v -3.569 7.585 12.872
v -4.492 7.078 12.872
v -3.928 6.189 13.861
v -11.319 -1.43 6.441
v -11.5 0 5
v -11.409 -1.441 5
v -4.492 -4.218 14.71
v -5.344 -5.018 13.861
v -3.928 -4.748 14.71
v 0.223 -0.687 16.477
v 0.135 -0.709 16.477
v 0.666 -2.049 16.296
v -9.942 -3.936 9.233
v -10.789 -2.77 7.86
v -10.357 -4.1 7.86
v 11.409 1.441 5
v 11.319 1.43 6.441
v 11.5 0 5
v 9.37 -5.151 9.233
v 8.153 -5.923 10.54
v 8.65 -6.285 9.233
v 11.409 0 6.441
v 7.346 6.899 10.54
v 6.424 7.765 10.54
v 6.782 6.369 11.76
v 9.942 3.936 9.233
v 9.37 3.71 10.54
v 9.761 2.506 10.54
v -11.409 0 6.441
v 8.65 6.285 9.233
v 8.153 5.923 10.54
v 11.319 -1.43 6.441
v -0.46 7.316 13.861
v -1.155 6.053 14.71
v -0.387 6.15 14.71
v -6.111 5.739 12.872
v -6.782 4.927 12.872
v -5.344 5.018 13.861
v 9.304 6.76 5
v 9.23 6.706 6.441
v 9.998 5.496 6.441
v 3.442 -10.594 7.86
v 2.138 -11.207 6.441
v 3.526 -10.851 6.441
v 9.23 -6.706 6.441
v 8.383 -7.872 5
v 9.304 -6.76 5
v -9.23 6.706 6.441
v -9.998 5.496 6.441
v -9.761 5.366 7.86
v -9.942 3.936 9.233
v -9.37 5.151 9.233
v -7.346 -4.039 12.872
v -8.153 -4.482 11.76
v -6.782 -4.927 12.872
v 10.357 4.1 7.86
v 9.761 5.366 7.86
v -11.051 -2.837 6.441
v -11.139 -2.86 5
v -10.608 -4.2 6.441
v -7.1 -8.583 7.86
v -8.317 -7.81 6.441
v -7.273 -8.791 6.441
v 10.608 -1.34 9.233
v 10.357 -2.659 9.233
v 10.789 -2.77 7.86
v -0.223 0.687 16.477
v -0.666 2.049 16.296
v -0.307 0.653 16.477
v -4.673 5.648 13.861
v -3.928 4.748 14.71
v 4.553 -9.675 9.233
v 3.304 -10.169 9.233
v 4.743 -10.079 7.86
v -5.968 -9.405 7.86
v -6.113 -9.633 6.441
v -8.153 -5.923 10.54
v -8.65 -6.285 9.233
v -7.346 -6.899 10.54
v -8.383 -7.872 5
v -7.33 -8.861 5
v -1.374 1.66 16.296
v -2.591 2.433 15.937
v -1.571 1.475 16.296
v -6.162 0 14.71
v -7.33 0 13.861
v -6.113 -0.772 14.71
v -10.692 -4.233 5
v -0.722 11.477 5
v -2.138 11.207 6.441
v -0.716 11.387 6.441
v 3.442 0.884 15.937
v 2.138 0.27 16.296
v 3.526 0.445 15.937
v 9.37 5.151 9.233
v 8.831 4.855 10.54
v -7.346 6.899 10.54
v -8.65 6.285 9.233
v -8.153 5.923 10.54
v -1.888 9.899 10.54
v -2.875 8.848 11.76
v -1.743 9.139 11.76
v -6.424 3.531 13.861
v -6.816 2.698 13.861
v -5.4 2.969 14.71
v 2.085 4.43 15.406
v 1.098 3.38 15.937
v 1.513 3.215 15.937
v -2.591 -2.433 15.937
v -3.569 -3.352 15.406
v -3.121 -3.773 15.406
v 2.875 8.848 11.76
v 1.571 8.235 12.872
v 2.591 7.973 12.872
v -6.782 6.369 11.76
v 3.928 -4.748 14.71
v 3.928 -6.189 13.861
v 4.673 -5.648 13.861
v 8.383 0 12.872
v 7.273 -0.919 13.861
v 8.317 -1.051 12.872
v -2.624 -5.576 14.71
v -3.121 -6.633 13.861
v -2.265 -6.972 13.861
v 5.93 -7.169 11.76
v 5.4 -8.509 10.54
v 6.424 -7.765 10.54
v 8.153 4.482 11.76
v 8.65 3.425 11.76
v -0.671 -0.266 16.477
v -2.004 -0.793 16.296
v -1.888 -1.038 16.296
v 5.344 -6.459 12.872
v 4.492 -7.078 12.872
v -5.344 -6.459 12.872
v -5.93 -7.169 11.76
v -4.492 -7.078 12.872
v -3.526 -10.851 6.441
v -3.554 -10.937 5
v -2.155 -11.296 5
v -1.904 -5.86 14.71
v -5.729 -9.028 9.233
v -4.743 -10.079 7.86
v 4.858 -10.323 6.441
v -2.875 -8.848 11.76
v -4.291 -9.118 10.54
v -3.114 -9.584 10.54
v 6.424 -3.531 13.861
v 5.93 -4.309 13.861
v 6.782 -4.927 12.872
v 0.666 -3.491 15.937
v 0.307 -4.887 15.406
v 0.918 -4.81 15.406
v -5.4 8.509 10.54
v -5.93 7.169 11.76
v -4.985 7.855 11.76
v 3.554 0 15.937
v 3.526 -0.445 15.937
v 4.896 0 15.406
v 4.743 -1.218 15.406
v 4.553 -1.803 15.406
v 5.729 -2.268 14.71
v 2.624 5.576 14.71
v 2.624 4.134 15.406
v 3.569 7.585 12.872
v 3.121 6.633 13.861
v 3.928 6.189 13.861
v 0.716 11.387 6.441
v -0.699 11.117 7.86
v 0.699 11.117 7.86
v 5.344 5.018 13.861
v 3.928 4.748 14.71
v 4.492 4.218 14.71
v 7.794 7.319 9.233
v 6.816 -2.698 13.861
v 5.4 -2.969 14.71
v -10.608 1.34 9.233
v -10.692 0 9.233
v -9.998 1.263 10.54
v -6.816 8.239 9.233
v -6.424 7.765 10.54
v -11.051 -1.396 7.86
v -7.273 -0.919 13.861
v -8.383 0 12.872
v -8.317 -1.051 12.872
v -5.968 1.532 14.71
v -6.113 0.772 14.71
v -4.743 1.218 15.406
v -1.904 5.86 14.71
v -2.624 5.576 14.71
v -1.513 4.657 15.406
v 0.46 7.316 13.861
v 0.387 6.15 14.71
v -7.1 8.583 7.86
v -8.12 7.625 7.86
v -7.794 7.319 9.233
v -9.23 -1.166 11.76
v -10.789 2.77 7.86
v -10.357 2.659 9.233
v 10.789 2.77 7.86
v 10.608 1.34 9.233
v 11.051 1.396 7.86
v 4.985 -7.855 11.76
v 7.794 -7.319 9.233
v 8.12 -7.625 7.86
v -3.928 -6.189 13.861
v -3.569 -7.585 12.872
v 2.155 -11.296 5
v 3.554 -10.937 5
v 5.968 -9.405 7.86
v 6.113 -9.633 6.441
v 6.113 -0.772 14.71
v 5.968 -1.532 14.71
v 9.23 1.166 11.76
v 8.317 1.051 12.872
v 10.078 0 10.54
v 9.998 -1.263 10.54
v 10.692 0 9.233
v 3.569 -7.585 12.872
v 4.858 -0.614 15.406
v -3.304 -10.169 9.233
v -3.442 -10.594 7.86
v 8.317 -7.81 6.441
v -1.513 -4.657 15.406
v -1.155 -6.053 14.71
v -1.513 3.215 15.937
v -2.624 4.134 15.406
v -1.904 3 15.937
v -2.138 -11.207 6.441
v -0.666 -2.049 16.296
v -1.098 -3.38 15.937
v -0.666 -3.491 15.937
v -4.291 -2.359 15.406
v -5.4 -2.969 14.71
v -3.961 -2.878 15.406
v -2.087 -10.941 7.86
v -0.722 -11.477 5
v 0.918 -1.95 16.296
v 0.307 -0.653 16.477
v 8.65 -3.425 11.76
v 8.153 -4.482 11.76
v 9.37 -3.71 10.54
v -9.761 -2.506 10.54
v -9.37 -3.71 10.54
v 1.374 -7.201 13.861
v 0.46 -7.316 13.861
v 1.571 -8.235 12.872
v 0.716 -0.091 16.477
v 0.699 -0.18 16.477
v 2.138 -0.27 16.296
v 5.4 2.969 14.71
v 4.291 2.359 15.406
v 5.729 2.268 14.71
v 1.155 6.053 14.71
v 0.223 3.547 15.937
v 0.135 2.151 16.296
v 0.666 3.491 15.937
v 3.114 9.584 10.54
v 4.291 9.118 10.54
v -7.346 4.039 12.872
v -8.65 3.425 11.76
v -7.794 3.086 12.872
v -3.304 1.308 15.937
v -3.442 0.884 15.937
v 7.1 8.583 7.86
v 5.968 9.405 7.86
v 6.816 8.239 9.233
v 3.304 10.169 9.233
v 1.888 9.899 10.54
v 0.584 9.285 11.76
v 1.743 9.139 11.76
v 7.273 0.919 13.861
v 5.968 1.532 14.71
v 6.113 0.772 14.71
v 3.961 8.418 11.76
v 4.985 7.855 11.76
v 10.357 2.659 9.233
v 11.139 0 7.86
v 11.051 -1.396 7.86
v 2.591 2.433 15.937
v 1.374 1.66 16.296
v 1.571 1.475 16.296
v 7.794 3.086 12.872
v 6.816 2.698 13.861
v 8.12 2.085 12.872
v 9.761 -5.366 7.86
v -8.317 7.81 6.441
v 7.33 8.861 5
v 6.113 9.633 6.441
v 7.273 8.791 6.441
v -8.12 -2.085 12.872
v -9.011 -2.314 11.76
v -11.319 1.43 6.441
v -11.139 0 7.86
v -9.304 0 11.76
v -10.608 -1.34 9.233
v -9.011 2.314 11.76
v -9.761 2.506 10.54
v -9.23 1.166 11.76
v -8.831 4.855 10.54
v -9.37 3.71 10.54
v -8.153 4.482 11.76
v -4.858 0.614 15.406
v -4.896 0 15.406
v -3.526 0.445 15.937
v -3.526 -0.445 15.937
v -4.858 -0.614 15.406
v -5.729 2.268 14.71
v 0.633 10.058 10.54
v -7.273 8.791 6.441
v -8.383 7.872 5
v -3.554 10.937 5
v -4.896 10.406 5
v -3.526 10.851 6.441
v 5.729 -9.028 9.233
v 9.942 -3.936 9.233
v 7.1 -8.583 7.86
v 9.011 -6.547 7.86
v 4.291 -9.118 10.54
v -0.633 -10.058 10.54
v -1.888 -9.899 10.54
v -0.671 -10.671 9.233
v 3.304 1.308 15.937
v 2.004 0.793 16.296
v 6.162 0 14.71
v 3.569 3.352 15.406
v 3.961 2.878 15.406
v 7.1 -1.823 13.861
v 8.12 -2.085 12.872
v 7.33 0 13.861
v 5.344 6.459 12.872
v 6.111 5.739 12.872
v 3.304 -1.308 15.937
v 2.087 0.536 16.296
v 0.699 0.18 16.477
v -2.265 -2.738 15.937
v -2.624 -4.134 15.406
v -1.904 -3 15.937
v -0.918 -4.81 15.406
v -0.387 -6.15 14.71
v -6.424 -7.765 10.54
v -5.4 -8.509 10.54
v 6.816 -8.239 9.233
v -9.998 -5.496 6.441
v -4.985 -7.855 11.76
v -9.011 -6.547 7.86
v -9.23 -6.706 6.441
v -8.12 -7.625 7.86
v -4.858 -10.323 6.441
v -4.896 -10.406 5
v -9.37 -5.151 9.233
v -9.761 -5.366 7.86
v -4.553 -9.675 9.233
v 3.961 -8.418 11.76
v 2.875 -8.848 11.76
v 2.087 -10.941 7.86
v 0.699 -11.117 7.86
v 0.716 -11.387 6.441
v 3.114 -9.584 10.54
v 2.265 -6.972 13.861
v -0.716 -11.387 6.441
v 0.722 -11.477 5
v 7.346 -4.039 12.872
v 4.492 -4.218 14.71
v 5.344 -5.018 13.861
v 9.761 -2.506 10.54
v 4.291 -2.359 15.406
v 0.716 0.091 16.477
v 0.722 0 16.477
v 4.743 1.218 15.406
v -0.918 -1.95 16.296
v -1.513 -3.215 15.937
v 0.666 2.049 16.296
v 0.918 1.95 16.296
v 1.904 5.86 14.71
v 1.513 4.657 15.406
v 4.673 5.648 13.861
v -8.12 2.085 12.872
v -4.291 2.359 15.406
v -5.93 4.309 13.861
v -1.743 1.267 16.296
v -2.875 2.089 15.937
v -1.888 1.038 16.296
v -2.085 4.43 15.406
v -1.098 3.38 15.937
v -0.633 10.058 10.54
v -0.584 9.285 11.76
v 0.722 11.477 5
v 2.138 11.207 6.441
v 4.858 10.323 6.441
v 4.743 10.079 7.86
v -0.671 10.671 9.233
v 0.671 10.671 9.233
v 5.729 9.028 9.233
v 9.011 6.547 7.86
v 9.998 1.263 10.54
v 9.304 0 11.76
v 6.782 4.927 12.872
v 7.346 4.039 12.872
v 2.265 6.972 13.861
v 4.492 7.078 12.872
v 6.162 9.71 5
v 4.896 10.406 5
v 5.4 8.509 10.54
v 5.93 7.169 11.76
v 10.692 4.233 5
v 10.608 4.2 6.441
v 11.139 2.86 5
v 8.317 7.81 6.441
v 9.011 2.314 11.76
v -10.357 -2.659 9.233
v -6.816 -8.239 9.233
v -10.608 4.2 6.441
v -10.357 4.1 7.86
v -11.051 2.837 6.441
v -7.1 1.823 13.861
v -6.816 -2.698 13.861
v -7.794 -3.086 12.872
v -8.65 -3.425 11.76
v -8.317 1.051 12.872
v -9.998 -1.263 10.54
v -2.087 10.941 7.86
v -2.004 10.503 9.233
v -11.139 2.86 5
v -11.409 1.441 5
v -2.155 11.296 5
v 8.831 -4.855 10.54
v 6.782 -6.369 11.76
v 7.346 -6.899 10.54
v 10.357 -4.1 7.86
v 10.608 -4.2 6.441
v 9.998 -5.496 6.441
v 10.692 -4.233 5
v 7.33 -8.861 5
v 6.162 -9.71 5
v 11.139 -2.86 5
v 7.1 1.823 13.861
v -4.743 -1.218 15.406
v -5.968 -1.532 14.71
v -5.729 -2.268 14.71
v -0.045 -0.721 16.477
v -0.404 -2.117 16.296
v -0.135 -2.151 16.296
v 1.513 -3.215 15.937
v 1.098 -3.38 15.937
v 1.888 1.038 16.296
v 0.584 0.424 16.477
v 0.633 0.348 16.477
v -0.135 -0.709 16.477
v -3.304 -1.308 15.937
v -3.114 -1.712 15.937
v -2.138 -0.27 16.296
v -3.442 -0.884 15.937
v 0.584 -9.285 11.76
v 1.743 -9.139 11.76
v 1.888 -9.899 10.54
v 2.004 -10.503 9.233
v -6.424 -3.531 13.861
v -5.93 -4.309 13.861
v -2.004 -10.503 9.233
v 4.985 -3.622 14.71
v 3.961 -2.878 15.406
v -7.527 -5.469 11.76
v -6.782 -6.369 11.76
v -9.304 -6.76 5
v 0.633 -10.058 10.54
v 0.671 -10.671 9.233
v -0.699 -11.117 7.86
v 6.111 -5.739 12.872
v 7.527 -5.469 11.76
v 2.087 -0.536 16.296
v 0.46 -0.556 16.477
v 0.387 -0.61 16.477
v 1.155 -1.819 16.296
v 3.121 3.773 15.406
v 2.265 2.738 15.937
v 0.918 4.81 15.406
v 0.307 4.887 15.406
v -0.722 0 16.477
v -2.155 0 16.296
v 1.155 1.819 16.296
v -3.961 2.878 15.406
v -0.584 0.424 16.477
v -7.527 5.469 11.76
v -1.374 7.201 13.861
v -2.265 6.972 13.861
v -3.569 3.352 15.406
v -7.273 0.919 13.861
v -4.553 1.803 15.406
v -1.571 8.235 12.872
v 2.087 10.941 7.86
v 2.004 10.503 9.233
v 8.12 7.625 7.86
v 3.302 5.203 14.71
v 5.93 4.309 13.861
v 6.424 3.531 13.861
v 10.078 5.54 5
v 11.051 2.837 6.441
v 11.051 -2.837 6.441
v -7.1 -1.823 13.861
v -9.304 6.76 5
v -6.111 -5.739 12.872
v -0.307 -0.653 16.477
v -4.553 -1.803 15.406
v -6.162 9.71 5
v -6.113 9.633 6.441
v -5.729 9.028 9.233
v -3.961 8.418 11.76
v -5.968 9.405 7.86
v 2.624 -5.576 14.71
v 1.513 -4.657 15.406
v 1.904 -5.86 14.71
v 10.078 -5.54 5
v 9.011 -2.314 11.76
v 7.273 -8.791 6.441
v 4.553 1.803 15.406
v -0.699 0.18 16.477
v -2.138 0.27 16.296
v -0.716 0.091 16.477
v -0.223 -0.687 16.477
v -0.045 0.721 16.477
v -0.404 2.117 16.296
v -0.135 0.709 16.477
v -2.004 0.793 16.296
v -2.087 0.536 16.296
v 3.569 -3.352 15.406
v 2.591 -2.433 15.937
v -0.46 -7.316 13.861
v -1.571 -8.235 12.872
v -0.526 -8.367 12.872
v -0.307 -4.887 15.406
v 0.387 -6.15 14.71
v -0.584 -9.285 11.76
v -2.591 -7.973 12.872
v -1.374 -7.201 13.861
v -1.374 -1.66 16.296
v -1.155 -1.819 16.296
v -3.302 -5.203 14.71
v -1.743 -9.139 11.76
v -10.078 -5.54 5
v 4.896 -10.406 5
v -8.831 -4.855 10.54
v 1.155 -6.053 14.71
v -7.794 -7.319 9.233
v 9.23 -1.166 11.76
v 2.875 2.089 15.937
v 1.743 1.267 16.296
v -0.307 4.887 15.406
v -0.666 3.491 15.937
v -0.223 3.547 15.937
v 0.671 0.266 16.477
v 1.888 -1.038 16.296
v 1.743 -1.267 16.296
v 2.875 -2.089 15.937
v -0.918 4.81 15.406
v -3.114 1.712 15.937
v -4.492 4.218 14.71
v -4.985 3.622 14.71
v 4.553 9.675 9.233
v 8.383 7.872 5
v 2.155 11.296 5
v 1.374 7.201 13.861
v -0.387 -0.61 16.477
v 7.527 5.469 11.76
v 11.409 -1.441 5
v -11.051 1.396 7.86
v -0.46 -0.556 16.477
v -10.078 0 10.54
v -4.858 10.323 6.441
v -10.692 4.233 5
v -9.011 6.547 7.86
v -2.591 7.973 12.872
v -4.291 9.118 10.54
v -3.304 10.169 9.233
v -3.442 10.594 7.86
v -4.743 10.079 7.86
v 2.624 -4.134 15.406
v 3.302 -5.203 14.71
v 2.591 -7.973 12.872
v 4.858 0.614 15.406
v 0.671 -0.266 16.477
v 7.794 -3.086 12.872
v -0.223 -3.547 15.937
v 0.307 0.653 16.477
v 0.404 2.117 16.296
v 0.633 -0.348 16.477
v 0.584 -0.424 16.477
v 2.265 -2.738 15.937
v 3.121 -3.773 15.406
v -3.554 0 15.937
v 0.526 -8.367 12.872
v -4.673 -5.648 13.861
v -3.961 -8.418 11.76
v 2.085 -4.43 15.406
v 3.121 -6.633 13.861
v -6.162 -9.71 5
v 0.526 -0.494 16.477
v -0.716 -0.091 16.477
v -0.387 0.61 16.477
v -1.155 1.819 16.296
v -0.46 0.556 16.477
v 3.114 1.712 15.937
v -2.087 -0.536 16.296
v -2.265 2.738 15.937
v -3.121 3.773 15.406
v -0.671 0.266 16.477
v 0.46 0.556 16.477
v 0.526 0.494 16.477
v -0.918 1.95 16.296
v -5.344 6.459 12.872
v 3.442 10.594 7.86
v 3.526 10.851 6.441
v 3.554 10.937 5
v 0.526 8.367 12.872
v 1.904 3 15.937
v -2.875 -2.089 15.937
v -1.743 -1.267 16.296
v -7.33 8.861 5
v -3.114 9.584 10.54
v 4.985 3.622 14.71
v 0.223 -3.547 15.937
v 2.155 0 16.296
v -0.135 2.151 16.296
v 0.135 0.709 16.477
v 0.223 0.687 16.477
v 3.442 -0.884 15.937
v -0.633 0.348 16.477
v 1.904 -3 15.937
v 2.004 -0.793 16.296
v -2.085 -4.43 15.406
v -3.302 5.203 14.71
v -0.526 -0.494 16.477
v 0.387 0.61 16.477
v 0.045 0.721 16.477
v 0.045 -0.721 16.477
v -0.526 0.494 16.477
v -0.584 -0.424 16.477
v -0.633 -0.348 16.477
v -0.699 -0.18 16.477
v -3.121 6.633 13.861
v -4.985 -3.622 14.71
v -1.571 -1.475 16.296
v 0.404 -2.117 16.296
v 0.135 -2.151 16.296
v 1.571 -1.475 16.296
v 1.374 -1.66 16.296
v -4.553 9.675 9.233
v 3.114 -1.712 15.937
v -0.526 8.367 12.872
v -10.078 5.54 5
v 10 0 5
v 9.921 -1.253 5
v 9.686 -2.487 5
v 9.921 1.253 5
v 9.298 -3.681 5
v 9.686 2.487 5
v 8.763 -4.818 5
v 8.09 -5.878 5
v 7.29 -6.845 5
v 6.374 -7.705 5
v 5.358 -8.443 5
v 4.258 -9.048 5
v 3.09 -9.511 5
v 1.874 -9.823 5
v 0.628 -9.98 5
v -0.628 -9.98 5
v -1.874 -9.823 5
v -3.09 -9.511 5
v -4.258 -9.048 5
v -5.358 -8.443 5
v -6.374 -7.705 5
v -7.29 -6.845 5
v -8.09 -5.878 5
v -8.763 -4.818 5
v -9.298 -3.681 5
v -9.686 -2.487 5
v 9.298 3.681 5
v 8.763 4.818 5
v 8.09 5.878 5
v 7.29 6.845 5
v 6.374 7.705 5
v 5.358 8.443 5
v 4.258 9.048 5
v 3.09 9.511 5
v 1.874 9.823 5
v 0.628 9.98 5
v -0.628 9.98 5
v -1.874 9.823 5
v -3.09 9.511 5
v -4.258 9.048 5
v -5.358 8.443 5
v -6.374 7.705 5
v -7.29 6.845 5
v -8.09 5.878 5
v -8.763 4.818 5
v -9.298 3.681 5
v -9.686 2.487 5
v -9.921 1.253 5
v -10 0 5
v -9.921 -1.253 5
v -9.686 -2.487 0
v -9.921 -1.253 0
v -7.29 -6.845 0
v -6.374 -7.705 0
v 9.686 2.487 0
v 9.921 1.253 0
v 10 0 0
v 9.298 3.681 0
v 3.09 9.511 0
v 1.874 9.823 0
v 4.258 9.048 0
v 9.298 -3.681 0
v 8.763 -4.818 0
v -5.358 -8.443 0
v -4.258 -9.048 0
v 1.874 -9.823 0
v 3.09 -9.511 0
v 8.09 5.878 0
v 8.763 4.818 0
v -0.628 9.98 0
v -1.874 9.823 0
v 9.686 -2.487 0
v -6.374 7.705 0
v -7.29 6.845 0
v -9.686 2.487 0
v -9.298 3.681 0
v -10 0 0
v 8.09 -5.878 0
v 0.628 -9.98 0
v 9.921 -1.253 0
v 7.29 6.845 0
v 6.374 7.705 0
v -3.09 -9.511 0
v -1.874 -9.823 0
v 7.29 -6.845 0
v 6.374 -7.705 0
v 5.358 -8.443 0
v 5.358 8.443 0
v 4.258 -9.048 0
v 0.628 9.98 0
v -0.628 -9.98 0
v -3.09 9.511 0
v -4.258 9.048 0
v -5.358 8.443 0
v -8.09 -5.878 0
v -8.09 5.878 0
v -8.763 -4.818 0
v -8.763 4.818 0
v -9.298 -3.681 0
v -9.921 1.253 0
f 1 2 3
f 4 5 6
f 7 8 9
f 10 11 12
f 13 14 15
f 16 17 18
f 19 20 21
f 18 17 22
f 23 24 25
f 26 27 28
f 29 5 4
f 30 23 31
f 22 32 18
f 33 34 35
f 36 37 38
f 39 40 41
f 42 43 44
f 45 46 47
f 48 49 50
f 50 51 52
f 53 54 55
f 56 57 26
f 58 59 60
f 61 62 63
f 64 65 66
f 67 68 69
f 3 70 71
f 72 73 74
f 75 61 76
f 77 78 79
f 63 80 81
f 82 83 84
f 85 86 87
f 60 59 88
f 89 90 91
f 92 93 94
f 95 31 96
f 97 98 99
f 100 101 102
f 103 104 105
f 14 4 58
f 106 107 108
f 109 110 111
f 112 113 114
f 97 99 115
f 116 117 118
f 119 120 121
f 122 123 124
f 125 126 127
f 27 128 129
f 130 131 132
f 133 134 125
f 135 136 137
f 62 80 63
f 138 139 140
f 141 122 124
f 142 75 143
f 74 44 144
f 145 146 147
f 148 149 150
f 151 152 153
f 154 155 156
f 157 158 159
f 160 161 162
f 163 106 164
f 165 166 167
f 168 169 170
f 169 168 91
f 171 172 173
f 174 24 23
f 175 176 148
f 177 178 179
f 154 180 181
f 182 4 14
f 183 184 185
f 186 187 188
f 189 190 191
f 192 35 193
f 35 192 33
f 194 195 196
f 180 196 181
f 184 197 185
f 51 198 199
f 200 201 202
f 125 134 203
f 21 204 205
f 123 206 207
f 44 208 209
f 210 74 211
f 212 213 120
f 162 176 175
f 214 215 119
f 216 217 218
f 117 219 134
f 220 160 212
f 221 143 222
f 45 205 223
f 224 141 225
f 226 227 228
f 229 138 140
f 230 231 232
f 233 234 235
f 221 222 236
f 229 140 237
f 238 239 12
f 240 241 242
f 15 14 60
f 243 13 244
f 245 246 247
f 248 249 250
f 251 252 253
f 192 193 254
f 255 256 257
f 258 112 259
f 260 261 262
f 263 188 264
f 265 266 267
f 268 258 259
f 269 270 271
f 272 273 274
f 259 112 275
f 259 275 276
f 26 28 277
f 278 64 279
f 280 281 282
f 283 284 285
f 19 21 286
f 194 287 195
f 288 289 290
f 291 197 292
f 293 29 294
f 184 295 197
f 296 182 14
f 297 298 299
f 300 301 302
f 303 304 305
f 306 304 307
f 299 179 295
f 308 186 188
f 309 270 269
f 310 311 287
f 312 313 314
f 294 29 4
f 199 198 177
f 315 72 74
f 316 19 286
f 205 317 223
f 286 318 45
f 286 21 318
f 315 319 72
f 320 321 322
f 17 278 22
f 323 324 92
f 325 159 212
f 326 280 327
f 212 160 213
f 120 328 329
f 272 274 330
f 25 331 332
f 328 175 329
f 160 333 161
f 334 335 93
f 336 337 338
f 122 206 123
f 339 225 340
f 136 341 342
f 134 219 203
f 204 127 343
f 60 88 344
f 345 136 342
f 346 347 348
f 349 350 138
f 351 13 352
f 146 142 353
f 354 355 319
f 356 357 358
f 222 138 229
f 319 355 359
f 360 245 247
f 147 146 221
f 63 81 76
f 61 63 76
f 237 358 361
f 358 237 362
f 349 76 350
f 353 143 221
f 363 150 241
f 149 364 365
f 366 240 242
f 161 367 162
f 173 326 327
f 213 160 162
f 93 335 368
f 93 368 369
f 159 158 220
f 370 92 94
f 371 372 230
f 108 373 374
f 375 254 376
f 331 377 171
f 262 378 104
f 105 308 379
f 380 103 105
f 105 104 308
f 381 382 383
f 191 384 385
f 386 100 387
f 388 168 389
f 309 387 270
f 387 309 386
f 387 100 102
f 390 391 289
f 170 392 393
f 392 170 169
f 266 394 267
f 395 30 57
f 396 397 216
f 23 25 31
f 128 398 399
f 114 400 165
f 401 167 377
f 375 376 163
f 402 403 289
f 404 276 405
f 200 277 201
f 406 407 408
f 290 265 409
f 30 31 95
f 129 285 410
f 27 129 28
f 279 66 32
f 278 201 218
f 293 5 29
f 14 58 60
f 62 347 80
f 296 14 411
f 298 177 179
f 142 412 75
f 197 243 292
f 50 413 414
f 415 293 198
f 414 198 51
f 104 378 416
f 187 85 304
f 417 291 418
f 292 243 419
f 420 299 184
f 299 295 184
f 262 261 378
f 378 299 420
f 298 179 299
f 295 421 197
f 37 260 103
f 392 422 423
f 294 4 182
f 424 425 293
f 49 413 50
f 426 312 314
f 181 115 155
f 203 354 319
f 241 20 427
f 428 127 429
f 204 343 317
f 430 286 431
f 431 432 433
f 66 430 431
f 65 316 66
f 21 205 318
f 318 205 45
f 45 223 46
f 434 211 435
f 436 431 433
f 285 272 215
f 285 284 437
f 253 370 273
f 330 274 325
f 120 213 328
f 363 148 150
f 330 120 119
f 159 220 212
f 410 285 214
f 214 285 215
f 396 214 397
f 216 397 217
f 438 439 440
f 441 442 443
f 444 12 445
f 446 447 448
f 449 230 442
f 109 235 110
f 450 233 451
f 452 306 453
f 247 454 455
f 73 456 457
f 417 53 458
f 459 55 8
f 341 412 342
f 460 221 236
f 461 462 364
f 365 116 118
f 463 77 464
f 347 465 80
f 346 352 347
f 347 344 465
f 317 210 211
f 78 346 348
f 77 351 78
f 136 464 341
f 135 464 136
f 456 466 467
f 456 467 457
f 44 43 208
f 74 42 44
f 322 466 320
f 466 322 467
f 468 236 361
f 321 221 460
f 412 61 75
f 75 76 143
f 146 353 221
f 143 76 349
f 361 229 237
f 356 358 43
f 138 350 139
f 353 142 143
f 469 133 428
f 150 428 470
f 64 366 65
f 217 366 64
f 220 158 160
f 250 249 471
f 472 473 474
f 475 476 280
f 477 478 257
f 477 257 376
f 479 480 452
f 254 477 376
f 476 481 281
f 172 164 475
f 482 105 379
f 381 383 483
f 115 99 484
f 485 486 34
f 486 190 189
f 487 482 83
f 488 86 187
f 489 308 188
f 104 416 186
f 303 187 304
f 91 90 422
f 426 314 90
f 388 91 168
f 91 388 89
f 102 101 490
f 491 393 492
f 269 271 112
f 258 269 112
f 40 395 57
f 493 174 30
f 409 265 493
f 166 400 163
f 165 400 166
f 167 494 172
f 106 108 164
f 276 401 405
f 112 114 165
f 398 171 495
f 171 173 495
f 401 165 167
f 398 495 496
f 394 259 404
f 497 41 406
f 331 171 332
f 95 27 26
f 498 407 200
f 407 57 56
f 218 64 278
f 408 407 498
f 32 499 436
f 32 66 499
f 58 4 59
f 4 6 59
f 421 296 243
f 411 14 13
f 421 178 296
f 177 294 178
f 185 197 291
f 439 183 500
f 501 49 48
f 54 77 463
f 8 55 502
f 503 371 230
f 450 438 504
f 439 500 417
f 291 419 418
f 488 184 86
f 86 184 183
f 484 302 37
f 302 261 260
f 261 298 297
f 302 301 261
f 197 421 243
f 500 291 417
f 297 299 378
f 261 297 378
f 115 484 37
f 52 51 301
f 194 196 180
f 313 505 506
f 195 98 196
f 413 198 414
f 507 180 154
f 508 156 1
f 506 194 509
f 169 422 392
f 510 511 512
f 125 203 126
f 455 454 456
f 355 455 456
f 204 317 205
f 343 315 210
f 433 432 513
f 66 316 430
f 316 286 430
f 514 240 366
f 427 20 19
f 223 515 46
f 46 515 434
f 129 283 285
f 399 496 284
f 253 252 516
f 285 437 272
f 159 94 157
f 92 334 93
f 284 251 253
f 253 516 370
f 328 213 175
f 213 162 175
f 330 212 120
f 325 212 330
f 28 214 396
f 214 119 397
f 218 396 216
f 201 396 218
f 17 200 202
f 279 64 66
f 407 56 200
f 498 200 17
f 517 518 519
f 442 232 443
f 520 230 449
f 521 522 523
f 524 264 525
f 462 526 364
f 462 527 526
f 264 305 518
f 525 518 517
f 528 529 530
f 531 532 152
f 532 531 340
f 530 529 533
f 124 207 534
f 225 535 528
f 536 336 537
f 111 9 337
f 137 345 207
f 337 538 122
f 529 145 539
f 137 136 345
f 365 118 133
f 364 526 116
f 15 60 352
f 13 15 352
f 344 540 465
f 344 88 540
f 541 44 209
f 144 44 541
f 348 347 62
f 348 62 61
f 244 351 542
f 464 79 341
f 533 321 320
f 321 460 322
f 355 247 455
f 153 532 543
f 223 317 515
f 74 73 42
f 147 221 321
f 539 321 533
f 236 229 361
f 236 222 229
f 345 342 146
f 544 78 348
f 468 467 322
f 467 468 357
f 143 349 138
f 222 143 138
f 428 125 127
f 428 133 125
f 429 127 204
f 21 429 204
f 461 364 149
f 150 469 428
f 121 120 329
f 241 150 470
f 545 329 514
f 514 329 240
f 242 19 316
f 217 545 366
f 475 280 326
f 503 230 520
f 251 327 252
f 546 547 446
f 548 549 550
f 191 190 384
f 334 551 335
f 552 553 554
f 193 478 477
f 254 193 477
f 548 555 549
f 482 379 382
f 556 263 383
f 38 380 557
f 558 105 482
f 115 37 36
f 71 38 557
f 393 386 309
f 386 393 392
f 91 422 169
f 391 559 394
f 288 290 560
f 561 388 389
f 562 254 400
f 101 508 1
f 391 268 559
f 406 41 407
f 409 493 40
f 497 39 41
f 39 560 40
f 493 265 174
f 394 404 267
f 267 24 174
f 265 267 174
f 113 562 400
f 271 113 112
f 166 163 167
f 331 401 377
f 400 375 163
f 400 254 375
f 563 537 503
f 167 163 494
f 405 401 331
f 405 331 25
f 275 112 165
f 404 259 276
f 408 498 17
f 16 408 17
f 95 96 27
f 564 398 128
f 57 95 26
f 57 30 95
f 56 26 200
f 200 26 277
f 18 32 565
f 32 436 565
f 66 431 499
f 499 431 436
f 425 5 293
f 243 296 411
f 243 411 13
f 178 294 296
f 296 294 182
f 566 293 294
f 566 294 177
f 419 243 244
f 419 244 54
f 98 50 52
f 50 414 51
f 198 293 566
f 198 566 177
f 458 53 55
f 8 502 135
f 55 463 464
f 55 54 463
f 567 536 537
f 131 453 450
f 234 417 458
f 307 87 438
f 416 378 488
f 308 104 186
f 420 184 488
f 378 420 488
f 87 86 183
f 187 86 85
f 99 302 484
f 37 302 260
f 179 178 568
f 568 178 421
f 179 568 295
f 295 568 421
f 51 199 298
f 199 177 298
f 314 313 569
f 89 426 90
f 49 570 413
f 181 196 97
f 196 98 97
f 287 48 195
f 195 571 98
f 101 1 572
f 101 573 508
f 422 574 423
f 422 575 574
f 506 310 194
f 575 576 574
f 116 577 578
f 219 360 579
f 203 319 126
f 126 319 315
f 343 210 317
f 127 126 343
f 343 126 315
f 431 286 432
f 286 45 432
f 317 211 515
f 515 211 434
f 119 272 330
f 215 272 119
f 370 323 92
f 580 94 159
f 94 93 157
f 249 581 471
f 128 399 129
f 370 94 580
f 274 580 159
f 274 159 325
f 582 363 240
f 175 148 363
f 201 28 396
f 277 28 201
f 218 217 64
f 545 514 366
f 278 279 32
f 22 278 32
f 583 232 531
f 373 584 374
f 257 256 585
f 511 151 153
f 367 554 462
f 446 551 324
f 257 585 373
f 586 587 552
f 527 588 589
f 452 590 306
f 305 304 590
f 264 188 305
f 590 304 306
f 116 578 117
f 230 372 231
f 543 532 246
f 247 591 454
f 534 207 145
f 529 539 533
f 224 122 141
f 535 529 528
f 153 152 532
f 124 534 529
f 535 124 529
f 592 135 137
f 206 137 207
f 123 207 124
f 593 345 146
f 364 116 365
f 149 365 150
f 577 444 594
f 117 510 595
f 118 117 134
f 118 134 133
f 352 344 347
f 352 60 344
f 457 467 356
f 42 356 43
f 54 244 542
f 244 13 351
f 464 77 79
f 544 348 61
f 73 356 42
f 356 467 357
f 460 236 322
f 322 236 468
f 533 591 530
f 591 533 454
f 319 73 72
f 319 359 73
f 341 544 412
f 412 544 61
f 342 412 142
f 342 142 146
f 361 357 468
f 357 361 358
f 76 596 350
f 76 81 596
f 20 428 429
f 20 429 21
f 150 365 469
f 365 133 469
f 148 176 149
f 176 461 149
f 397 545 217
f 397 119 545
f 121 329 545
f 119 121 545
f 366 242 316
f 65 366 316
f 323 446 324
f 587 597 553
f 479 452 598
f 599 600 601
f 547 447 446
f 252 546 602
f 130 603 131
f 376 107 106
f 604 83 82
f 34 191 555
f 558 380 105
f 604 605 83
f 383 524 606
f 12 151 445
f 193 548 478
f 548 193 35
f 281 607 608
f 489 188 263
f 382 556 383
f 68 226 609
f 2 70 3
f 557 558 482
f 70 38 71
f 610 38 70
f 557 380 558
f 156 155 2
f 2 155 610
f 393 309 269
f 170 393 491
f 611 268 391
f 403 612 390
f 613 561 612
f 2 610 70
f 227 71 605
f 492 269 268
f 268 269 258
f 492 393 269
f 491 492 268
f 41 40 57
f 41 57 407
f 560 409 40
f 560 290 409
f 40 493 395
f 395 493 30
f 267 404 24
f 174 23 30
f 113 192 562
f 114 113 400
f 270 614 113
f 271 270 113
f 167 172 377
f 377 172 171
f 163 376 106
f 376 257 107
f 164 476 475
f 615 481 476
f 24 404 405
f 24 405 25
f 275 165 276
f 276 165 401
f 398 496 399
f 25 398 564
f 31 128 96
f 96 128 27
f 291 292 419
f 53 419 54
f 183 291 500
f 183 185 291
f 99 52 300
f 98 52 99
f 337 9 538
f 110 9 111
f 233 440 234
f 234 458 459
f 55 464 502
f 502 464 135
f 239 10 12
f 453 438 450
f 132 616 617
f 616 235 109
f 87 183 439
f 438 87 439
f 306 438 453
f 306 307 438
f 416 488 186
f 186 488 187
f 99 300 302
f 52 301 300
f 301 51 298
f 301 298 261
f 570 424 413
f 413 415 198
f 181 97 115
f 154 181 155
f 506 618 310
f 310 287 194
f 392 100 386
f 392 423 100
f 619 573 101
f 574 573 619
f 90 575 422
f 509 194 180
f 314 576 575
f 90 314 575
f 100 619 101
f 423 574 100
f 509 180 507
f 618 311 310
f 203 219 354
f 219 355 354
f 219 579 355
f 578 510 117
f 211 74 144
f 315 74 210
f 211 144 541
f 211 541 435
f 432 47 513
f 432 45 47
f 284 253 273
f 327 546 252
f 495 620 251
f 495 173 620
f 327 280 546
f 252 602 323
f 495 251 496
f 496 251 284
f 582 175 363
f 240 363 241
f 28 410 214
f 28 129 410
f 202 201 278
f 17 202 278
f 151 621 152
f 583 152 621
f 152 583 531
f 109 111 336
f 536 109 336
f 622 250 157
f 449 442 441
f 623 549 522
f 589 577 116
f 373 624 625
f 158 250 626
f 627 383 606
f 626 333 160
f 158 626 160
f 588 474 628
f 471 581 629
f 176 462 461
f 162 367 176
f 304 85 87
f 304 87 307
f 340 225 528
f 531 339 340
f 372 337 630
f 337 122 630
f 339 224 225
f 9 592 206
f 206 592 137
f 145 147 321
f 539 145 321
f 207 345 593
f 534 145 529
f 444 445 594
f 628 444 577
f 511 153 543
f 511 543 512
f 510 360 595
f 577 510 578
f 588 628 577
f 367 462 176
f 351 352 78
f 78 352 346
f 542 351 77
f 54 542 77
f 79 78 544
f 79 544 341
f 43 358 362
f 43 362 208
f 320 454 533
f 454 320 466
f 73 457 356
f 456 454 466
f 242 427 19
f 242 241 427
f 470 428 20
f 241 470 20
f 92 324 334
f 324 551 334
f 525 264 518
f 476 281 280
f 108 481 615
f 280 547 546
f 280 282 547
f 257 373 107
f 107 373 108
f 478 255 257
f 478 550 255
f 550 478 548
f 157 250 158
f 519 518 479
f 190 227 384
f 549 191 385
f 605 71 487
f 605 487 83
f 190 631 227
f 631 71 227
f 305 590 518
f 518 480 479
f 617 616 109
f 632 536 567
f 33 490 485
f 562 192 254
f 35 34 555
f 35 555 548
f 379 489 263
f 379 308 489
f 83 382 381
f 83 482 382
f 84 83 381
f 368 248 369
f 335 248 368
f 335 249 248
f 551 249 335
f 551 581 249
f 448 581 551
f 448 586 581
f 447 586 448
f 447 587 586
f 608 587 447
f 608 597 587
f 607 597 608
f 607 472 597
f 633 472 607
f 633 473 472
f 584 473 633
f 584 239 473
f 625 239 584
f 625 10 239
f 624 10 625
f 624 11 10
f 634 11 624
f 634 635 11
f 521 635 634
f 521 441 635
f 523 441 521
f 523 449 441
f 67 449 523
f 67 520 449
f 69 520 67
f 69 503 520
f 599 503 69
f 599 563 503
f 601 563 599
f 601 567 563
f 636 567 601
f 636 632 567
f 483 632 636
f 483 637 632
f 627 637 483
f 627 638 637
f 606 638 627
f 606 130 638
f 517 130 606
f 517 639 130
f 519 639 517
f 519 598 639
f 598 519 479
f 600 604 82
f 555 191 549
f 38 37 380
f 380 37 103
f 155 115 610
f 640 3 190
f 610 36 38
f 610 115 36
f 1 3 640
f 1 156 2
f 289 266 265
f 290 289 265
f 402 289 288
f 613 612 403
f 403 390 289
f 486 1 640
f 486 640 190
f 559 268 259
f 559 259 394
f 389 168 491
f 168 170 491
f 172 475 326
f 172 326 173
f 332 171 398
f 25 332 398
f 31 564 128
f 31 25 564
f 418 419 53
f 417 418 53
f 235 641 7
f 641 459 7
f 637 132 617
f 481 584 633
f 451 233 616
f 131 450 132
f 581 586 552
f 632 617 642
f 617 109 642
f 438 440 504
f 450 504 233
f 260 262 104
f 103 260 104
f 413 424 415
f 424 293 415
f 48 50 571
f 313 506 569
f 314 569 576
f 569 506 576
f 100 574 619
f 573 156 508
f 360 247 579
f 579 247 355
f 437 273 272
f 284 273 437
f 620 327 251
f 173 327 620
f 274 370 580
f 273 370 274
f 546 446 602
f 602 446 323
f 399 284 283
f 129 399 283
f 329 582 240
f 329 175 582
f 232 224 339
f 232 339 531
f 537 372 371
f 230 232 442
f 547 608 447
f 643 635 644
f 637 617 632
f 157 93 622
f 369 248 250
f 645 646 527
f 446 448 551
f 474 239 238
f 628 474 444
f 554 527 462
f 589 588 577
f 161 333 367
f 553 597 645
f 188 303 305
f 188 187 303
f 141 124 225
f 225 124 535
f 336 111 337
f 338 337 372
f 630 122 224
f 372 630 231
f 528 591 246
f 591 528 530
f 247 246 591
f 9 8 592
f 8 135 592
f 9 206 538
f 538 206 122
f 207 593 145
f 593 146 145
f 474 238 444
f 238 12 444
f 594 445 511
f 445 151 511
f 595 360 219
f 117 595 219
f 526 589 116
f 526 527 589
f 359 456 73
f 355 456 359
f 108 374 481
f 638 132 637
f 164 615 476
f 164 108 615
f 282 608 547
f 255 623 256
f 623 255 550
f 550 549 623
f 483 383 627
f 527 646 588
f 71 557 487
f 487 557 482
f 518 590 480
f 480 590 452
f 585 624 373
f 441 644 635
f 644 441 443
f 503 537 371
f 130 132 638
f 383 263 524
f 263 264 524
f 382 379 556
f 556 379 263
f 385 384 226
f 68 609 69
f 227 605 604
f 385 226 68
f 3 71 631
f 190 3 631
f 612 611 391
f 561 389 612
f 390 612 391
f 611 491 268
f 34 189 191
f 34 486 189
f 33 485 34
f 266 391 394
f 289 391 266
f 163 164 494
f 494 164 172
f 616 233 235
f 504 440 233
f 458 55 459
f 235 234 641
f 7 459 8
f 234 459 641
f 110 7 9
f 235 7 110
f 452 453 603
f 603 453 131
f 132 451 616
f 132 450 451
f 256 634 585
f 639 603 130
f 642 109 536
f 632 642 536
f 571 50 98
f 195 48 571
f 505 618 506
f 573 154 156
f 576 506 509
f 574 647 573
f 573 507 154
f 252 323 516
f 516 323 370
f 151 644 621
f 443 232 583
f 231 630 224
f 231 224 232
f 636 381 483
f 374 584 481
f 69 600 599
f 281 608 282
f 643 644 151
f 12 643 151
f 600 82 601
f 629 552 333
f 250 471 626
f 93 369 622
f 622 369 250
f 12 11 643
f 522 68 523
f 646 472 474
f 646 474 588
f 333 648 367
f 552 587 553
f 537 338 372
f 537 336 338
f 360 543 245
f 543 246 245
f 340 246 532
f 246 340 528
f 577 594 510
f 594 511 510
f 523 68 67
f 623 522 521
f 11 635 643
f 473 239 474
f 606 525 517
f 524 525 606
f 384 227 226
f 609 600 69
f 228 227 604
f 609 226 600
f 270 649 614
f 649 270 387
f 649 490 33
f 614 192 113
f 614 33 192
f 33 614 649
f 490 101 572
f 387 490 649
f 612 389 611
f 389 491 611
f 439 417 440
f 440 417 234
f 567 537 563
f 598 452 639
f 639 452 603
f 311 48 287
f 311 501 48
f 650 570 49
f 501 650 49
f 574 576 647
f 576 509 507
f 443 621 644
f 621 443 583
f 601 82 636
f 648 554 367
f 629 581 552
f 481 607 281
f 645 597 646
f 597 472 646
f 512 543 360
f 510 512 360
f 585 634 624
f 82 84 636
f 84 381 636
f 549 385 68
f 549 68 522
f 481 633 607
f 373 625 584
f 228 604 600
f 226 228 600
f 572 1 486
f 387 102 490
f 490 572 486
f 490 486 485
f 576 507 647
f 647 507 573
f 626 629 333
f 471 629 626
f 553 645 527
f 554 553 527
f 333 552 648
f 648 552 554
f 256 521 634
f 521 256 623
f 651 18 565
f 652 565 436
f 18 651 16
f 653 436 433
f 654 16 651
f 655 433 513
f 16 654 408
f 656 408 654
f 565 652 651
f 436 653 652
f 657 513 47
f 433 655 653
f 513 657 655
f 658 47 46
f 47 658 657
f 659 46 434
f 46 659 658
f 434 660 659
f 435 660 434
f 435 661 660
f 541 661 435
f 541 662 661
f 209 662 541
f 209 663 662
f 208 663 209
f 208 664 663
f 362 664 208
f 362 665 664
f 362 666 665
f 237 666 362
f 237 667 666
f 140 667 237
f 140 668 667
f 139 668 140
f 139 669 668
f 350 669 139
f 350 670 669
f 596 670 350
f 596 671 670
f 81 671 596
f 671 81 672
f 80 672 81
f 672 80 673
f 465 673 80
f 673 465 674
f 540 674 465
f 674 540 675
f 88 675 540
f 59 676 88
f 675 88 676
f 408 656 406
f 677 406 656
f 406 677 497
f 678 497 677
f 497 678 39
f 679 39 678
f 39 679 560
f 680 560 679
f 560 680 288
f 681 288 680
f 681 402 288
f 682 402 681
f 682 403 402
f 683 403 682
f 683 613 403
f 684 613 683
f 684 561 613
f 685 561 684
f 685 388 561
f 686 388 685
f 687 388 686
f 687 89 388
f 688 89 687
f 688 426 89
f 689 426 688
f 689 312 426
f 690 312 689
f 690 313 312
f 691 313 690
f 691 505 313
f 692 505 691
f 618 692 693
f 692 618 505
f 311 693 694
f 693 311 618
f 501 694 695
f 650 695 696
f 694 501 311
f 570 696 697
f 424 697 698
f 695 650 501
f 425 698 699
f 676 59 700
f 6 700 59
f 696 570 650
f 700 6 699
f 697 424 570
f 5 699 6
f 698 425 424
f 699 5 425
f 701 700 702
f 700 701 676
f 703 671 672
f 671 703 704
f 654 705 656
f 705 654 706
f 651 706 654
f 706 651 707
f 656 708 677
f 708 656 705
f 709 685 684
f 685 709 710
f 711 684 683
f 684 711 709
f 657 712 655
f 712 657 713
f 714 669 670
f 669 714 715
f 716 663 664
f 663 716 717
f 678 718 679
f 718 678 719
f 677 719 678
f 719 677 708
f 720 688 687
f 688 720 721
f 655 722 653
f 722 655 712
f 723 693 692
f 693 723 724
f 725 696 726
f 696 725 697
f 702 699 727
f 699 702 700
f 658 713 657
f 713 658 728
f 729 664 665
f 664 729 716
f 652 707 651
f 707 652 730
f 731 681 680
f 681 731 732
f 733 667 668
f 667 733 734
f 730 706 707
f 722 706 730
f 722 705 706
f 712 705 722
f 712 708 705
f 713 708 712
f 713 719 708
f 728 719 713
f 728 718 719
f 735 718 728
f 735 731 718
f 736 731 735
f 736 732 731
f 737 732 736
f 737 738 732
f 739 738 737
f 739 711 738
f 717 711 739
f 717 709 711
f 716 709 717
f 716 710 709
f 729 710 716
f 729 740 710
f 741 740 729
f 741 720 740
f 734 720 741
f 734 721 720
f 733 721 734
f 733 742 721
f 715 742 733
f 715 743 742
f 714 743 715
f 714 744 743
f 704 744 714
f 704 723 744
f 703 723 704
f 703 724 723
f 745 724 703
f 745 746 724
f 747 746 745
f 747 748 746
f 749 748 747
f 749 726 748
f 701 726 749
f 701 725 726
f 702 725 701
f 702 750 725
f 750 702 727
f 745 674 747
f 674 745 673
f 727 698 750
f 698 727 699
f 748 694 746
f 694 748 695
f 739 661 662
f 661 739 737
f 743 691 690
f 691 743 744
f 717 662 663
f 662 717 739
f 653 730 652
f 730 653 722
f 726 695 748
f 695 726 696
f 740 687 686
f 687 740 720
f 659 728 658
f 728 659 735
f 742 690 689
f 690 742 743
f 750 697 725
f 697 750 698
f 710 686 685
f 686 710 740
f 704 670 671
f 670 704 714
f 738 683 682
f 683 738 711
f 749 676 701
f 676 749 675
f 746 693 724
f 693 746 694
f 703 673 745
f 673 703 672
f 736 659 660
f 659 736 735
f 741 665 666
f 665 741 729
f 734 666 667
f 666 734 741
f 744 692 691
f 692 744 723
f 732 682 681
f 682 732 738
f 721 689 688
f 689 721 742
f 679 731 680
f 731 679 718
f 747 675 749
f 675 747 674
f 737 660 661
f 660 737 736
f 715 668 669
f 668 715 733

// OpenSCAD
/* [peg parameters] */
// How big is the hole you are filling
peg_diameter = 20;
// How deep does it go in the hole?
peg_height = 5;

/* [cap parameters] */
// The base width of the cap (should be a little bigger than the peg
cap_diameter = 23;
// 1-Dome, 2-Flat
type = 1;

/* [Hidden] */
$fn = 50;


// Make the peg
cylinder(d=peg_diameter, h=peg_height);

//Make the cap, on top of the peg
translate([0,0,peg_height])
    intersection(){
        if (type==1) {
            sphere(d=cap_diameter);
        } else {
            cylinder(d=cap_diameter);
        }
        translate([0,0,cap_diameter/2])
        cube(size=cap_diameter, center=true);
        }
